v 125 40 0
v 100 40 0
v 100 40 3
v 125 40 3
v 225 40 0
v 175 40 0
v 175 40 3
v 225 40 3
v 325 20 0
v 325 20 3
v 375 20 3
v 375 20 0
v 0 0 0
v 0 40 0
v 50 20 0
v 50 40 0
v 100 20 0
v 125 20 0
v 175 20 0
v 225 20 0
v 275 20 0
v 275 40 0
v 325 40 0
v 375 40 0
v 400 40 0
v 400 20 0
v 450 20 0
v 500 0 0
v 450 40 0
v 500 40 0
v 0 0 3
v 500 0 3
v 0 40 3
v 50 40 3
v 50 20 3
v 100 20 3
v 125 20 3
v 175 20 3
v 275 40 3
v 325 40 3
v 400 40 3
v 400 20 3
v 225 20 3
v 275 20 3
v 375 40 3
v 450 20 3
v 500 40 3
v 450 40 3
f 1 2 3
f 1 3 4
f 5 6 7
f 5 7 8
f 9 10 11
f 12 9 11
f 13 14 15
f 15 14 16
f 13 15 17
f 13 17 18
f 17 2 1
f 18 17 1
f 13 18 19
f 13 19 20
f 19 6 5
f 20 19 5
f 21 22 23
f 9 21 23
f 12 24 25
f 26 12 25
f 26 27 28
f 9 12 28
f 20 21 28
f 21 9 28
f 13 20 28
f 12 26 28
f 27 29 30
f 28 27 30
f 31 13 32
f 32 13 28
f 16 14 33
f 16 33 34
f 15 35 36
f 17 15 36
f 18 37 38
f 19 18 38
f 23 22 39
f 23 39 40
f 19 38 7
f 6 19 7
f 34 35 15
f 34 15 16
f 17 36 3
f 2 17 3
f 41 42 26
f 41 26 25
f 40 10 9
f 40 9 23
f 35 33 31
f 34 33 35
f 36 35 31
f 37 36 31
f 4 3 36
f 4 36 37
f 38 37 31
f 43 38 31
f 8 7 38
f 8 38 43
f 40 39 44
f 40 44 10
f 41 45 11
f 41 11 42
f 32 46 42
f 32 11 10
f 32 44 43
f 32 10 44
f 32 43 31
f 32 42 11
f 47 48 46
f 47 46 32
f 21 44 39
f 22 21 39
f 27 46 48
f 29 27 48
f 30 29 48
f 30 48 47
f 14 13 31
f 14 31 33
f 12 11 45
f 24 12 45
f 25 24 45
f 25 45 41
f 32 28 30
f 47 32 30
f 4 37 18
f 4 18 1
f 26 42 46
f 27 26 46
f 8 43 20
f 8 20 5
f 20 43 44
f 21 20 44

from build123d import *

# Parameters (mm, degrees)
SKETCH1_W           = 500
SKETCH1_H           = 40
BOSS_EXTRUDE1_DEPTH = 3
SKETCH3_W           = 50
SKETCH3_H           = 20
CUT_EXTRUDE2_DEPTH  = 4


with BuildPart() as part:
    # Sketch1 → Boss-Extrude1 (new body)
    with BuildSketch(Plane.XY):
        with Locations((250, 20)):
            Rectangle(SKETCH1_W, SKETCH1_H)
    extrude(amount=BOSS_EXTRUDE1_DEPTH)

    # Sketch3 → Cut-Extrude2 (cut, through all)
    with BuildSketch(Plane.XY.offset(3)):
        with Locations((75, 30)):
            Rectangle(SKETCH3_W, SKETCH3_H)
        with Locations((150, 30)):
            Rectangle(SKETCH3_W, SKETCH3_H)
        with Locations((250, 30)):
            Rectangle(SKETCH3_W, SKETCH3_H)
        with Locations((425, 30)):
            Rectangle(SKETCH3_W, SKETCH3_H)
        with Locations((350, 30)):
            Rectangle(SKETCH3_W, SKETCH3_H)
    extrude(amount=-CUT_EXTRUDE2_DEPTH, mode=Mode.SUBTRACT)


solid = part.part
